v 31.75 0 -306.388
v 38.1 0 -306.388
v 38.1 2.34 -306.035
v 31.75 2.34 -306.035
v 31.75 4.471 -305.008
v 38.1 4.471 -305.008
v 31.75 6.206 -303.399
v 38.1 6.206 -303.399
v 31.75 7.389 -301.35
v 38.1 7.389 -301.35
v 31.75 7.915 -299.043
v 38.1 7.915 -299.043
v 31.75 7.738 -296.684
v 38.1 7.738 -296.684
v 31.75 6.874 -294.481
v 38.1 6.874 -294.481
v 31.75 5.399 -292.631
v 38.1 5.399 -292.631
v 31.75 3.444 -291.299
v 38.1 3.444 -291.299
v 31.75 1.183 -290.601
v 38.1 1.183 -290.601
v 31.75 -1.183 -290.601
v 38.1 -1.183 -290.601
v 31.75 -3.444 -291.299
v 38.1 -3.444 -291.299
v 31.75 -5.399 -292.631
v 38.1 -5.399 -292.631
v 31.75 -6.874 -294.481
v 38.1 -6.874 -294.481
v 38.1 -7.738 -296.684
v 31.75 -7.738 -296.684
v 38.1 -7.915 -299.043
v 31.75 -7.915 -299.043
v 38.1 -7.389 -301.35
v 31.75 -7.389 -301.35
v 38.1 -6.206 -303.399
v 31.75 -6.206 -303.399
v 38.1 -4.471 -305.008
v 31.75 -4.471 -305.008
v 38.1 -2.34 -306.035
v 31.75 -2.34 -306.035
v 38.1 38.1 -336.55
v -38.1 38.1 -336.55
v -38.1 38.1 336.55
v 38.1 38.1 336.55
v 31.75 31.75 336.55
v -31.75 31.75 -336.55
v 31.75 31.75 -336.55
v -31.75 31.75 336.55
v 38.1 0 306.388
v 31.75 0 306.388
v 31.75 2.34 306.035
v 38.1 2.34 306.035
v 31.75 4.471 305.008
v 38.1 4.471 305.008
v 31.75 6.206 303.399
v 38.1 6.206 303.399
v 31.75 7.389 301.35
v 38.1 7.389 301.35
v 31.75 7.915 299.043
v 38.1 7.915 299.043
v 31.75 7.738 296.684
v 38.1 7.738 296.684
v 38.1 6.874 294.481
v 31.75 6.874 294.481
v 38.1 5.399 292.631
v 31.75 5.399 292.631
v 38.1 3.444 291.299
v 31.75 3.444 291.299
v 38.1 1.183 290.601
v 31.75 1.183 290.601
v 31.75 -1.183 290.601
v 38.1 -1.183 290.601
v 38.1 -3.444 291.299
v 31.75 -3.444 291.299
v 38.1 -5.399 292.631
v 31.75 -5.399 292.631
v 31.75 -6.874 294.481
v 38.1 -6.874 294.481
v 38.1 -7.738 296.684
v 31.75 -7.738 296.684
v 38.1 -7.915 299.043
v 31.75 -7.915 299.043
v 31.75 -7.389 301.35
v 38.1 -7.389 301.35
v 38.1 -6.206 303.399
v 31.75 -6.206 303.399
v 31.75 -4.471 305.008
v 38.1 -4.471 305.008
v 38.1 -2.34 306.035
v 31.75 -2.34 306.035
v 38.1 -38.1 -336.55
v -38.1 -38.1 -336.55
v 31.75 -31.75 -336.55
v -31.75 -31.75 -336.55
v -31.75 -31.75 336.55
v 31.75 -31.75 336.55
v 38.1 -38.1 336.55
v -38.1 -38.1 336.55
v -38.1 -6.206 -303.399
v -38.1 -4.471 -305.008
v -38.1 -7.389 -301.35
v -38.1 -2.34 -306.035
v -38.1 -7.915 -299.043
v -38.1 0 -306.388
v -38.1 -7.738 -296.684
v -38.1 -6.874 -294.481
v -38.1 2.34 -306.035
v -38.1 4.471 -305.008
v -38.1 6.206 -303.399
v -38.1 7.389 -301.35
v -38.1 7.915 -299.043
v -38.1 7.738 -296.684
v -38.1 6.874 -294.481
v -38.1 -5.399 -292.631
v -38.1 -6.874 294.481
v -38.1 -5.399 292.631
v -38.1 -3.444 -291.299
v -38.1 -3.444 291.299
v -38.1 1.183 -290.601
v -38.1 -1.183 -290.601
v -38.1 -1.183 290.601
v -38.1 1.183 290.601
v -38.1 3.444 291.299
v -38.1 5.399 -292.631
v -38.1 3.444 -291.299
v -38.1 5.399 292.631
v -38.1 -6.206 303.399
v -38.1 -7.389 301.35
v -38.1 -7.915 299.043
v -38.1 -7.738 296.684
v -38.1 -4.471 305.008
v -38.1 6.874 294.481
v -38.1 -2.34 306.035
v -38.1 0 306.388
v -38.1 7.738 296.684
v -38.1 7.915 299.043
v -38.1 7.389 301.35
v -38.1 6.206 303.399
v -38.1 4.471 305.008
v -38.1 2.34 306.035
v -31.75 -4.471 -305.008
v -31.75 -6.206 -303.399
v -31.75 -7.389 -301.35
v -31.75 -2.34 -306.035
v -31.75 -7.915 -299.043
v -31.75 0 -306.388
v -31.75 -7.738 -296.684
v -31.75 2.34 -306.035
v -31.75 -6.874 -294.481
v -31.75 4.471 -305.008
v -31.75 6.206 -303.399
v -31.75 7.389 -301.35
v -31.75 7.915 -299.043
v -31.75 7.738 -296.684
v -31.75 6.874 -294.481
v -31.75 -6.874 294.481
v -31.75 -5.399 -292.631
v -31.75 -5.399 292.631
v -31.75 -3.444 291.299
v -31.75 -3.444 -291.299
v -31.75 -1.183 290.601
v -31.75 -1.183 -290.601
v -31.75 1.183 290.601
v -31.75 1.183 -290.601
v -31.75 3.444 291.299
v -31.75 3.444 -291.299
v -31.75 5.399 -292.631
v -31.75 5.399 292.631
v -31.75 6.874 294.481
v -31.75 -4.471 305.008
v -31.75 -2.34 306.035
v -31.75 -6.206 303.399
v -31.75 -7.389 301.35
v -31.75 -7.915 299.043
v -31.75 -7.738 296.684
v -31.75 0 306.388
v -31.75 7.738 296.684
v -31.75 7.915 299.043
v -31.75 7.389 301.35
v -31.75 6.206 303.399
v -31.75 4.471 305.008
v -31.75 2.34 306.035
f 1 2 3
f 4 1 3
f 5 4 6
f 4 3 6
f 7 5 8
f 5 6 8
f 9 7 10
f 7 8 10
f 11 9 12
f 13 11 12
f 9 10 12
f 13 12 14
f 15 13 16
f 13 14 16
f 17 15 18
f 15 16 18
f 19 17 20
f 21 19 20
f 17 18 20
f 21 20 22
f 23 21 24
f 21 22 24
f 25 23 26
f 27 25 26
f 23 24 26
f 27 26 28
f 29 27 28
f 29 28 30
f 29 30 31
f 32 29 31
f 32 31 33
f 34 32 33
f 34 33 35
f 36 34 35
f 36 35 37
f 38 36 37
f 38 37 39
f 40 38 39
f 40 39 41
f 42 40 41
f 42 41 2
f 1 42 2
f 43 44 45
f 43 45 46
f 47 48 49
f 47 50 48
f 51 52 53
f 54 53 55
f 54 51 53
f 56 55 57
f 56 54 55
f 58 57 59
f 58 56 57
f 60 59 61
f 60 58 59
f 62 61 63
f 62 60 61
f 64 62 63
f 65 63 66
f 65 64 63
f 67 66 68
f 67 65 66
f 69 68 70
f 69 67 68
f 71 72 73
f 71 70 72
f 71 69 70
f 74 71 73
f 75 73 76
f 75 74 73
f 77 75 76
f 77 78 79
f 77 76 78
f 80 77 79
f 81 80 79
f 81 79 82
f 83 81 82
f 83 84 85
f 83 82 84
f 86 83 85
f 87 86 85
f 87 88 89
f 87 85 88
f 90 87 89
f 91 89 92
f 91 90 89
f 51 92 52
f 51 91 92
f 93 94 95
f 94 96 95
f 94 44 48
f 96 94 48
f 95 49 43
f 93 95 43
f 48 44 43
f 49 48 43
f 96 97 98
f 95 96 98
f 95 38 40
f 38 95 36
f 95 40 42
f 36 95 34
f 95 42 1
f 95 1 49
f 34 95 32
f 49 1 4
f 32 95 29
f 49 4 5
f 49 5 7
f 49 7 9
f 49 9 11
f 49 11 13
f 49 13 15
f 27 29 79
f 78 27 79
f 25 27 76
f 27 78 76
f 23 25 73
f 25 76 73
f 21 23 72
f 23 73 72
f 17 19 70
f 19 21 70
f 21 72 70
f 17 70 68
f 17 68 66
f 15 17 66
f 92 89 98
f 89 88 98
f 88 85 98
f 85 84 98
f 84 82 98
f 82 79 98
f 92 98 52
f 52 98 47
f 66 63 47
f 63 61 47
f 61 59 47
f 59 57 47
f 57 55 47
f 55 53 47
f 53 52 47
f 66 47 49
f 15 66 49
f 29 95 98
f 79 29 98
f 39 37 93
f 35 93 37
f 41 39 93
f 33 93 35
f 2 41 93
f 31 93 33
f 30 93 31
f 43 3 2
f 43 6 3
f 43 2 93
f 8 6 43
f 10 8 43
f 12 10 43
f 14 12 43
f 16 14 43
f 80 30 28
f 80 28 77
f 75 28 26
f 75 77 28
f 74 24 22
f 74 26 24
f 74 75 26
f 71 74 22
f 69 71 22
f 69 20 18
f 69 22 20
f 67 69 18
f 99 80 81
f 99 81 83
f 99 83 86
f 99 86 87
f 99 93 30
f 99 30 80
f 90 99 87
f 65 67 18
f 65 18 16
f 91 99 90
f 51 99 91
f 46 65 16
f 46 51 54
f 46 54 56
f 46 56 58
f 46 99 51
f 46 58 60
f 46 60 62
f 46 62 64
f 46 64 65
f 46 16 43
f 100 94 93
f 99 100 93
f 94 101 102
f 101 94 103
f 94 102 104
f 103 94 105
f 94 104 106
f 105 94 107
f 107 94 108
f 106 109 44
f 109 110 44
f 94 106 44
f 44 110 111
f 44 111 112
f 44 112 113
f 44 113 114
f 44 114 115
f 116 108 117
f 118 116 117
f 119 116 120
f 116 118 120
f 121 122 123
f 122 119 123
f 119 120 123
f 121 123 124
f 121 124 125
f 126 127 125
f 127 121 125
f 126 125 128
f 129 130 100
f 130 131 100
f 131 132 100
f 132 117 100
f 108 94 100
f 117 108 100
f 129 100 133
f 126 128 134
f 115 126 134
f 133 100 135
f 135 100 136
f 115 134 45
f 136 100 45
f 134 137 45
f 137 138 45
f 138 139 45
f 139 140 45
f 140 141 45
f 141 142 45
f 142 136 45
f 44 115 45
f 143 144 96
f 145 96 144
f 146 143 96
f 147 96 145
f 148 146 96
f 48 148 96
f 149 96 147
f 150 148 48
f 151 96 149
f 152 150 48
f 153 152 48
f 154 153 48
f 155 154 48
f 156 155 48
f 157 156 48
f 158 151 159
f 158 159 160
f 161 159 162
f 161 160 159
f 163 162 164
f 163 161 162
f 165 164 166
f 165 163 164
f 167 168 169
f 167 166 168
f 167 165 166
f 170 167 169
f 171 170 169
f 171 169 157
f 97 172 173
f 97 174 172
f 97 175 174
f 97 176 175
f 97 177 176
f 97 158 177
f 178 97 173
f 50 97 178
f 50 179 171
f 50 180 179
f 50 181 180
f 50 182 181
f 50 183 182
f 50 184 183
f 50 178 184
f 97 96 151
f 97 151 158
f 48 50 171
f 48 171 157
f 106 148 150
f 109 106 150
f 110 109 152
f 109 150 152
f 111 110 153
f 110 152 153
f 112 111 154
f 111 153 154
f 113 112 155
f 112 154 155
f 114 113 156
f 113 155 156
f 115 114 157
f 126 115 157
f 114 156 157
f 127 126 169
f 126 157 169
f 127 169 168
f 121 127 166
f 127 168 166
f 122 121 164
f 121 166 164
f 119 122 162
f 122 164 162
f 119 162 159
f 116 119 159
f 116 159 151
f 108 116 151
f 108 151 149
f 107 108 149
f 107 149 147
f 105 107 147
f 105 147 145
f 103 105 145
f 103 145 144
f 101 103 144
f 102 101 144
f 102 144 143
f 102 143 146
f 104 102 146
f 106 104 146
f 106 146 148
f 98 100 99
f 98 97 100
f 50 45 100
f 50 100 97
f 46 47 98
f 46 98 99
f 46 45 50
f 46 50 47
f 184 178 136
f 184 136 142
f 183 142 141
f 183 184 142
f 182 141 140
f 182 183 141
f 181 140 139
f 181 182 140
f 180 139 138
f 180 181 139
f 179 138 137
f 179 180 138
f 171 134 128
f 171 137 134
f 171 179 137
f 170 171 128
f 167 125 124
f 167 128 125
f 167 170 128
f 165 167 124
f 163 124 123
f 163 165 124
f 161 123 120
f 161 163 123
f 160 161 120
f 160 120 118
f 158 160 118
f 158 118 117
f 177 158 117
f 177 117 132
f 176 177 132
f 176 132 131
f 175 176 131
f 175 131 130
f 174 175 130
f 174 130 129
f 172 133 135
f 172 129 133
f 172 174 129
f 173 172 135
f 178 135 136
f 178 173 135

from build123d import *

# Parameters (mm, degrees)
SKETCH1_W           = 76.2
SKETCH1_H           = 76.2
SKETCH1_W_2         = 63.5
SKETCH1_H_2         = 63.5
BOSS_EXTRUDE1_DEPTH = 336.55
SKETCH2_R           = 7.9375
CUT_EXTRUDE1_DEPTH  = 77.2


with BuildPart() as part:
    # Sketch1 → Boss-Extrude1 (new body, symmetric)
    with BuildSketch(Plane.XY):
        Rectangle(SKETCH1_W, SKETCH1_H)
        Rectangle(SKETCH1_W_2, SKETCH1_H_2, mode=Mode.SUBTRACT)
    extrude(amount=BOSS_EXTRUDE1_DEPTH, both=True)

    # Sketch2 → Cut-Extrude1 (cut, through all)
    with BuildSketch(Plane(origin=(38.1, 0, 0), x_dir=(0, 0, -1), z_dir=(1, 0, 0))):
        with Locations((298.45, 0)):
            Circle(SKETCH2_R)
    cut_extrude1 = extrude(amount=-CUT_EXTRUDE1_DEPTH, mode=Mode.SUBTRACT)

    # Mirror1: Cut-Extrude1 across plane
    add(cut_extrude1.mirror(Plane.XY), mode=Mode.SUBTRACT)


solid = part.part
